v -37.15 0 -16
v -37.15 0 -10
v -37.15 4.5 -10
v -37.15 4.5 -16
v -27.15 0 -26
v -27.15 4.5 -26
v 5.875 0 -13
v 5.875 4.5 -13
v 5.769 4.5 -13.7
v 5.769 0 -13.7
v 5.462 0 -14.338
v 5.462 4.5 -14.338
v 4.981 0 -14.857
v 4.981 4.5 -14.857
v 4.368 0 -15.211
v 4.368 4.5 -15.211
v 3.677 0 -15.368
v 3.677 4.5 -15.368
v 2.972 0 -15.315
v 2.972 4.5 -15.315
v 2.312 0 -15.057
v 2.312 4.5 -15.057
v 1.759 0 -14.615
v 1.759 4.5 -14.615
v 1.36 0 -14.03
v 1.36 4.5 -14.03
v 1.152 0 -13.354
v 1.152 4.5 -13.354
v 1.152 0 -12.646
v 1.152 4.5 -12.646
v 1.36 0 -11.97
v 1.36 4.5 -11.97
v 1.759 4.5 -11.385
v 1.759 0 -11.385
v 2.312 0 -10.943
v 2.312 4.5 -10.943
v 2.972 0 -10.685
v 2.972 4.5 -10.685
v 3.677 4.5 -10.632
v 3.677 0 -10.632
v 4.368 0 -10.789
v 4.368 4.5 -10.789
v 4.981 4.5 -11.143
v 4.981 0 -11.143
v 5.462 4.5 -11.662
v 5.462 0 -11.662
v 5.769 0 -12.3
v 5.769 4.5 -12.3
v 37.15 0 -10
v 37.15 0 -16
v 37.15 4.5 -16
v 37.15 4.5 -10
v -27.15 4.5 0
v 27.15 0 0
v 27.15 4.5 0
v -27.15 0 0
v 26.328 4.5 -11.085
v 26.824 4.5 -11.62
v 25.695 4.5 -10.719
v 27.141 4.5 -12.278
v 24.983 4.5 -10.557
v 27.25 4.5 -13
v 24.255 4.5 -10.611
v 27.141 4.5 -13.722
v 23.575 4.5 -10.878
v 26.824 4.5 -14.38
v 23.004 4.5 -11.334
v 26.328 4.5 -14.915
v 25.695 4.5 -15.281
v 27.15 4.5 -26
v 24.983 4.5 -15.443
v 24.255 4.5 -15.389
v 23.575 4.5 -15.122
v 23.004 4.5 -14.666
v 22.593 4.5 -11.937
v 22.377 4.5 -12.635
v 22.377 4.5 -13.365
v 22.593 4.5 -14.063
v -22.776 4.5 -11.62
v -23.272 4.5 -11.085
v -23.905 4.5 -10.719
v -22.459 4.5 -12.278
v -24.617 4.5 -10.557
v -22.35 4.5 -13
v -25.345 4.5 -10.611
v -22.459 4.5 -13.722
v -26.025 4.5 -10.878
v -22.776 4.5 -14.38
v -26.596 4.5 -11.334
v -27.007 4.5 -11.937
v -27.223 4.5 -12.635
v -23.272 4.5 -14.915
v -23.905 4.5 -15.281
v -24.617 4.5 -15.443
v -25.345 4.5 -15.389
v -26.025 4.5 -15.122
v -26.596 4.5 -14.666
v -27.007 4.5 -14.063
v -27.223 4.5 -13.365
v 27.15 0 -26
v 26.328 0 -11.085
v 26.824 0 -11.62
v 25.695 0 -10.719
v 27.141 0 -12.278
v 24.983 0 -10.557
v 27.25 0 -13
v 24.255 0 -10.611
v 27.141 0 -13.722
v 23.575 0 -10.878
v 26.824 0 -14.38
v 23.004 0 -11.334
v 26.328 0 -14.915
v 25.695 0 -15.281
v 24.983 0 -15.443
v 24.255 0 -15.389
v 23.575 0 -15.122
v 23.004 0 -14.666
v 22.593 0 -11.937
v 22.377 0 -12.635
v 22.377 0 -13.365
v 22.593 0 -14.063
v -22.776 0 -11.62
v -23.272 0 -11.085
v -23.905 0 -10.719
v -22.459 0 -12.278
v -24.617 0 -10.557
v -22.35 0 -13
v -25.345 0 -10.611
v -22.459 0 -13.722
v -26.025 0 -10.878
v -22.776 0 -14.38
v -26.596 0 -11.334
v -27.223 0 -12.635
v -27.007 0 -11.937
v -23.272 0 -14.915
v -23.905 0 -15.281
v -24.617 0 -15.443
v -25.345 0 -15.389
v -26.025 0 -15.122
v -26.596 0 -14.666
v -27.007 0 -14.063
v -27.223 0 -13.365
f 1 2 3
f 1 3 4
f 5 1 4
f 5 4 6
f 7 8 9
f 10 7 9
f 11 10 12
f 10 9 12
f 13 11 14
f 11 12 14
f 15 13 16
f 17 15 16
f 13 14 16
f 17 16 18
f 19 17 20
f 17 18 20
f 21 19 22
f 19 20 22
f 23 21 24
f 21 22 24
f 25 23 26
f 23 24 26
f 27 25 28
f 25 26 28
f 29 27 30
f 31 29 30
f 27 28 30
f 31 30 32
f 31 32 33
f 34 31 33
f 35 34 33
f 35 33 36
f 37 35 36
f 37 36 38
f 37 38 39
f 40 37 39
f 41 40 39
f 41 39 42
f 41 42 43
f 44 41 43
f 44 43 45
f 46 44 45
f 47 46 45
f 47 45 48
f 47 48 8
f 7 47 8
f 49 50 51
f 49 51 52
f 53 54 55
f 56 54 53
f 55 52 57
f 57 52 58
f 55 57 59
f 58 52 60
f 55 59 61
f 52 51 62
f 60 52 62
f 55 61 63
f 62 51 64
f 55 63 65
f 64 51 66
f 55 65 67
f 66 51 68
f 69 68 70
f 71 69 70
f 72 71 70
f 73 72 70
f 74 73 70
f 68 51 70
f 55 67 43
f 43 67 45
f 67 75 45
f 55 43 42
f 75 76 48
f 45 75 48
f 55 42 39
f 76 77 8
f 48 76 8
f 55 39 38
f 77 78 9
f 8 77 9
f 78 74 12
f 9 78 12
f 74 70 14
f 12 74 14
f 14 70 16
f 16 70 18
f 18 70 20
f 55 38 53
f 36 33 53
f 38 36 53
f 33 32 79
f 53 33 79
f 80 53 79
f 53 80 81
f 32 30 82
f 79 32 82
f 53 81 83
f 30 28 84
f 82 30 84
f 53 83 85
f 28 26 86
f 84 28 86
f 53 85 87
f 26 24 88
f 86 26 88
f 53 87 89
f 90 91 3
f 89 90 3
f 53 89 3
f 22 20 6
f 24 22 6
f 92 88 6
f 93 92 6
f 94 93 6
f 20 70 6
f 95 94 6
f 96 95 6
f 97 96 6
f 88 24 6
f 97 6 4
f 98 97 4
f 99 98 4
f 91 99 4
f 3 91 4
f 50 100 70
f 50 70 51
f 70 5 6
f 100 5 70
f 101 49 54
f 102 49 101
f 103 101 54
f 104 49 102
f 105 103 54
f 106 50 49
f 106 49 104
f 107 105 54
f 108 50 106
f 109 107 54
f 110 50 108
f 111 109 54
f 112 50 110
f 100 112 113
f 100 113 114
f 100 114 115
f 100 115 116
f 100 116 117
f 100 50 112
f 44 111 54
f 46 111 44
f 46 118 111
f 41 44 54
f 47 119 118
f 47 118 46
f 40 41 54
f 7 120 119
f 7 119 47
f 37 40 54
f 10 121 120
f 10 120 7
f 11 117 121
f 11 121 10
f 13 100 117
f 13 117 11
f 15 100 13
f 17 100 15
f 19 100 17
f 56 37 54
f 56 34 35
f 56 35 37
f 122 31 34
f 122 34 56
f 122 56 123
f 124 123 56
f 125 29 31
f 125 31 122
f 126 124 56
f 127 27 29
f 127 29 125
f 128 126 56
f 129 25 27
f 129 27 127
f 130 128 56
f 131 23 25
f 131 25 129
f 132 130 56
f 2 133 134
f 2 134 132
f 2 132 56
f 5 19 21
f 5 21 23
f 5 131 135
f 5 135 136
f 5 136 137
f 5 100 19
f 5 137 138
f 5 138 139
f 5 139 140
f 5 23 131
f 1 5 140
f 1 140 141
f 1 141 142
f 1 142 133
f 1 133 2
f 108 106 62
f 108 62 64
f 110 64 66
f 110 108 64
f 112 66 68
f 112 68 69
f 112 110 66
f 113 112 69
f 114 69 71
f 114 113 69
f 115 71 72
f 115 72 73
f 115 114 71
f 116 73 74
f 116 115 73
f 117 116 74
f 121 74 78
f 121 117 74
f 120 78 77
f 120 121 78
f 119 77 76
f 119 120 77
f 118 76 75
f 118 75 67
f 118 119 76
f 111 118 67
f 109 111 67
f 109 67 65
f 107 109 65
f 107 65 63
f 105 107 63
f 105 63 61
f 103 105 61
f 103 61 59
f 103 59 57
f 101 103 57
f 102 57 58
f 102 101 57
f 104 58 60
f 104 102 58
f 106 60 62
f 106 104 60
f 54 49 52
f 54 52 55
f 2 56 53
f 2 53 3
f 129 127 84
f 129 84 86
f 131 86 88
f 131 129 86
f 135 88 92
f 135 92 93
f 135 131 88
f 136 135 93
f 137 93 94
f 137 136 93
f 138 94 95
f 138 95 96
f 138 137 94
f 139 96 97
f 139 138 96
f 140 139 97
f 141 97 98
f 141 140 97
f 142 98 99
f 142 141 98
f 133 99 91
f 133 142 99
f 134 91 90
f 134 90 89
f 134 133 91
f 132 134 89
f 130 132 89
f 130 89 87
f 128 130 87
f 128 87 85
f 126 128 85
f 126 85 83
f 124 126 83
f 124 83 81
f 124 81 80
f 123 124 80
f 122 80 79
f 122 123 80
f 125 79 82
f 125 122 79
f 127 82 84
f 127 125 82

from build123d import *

# Parameters (mm, degrees)
SKETCH1_R           = 2.45
BOSS_EXTRUDE1_DEPTH = 4.5
SKETCH2_R           = 2.375
CUT_EXTRUDE1_DEPTH  = 5.5


with BuildPart() as part:
    # Sketch1 → Boss-Extrude1 (new body)
    with BuildSketch(Plane(origin=(0, 0, 0), x_dir=(1, 0, 0), z_dir=(0, 1, 0))):
        Polygon((27.15, 26), (37.15, 16), (37.15, 10), (27.15, 0), (-27.15, 0), (-37.15, 10), (-37.15, 16), (-27.15, 26), align=None)
        with Locations((24.8, 13)):
            Circle(SKETCH1_R, mode=Mode.SUBTRACT)
        with Locations((-24.8, 13)):
            Circle(SKETCH1_R, mode=Mode.SUBTRACT)
    extrude(amount=BOSS_EXTRUDE1_DEPTH)

    # Sketch2 → Cut-Extrude1 (cut, through all)
    with BuildSketch(Plane(origin=(0, 4.5, 0), x_dir=(1, 0, 0), z_dir=(0, 1, 0))):
        with Locations((3.5, 13)):
            Circle(SKETCH2_R)
    extrude(amount=-CUT_EXTRUDE1_DEPTH, mode=Mode.SUBTRACT)


solid = part.part
